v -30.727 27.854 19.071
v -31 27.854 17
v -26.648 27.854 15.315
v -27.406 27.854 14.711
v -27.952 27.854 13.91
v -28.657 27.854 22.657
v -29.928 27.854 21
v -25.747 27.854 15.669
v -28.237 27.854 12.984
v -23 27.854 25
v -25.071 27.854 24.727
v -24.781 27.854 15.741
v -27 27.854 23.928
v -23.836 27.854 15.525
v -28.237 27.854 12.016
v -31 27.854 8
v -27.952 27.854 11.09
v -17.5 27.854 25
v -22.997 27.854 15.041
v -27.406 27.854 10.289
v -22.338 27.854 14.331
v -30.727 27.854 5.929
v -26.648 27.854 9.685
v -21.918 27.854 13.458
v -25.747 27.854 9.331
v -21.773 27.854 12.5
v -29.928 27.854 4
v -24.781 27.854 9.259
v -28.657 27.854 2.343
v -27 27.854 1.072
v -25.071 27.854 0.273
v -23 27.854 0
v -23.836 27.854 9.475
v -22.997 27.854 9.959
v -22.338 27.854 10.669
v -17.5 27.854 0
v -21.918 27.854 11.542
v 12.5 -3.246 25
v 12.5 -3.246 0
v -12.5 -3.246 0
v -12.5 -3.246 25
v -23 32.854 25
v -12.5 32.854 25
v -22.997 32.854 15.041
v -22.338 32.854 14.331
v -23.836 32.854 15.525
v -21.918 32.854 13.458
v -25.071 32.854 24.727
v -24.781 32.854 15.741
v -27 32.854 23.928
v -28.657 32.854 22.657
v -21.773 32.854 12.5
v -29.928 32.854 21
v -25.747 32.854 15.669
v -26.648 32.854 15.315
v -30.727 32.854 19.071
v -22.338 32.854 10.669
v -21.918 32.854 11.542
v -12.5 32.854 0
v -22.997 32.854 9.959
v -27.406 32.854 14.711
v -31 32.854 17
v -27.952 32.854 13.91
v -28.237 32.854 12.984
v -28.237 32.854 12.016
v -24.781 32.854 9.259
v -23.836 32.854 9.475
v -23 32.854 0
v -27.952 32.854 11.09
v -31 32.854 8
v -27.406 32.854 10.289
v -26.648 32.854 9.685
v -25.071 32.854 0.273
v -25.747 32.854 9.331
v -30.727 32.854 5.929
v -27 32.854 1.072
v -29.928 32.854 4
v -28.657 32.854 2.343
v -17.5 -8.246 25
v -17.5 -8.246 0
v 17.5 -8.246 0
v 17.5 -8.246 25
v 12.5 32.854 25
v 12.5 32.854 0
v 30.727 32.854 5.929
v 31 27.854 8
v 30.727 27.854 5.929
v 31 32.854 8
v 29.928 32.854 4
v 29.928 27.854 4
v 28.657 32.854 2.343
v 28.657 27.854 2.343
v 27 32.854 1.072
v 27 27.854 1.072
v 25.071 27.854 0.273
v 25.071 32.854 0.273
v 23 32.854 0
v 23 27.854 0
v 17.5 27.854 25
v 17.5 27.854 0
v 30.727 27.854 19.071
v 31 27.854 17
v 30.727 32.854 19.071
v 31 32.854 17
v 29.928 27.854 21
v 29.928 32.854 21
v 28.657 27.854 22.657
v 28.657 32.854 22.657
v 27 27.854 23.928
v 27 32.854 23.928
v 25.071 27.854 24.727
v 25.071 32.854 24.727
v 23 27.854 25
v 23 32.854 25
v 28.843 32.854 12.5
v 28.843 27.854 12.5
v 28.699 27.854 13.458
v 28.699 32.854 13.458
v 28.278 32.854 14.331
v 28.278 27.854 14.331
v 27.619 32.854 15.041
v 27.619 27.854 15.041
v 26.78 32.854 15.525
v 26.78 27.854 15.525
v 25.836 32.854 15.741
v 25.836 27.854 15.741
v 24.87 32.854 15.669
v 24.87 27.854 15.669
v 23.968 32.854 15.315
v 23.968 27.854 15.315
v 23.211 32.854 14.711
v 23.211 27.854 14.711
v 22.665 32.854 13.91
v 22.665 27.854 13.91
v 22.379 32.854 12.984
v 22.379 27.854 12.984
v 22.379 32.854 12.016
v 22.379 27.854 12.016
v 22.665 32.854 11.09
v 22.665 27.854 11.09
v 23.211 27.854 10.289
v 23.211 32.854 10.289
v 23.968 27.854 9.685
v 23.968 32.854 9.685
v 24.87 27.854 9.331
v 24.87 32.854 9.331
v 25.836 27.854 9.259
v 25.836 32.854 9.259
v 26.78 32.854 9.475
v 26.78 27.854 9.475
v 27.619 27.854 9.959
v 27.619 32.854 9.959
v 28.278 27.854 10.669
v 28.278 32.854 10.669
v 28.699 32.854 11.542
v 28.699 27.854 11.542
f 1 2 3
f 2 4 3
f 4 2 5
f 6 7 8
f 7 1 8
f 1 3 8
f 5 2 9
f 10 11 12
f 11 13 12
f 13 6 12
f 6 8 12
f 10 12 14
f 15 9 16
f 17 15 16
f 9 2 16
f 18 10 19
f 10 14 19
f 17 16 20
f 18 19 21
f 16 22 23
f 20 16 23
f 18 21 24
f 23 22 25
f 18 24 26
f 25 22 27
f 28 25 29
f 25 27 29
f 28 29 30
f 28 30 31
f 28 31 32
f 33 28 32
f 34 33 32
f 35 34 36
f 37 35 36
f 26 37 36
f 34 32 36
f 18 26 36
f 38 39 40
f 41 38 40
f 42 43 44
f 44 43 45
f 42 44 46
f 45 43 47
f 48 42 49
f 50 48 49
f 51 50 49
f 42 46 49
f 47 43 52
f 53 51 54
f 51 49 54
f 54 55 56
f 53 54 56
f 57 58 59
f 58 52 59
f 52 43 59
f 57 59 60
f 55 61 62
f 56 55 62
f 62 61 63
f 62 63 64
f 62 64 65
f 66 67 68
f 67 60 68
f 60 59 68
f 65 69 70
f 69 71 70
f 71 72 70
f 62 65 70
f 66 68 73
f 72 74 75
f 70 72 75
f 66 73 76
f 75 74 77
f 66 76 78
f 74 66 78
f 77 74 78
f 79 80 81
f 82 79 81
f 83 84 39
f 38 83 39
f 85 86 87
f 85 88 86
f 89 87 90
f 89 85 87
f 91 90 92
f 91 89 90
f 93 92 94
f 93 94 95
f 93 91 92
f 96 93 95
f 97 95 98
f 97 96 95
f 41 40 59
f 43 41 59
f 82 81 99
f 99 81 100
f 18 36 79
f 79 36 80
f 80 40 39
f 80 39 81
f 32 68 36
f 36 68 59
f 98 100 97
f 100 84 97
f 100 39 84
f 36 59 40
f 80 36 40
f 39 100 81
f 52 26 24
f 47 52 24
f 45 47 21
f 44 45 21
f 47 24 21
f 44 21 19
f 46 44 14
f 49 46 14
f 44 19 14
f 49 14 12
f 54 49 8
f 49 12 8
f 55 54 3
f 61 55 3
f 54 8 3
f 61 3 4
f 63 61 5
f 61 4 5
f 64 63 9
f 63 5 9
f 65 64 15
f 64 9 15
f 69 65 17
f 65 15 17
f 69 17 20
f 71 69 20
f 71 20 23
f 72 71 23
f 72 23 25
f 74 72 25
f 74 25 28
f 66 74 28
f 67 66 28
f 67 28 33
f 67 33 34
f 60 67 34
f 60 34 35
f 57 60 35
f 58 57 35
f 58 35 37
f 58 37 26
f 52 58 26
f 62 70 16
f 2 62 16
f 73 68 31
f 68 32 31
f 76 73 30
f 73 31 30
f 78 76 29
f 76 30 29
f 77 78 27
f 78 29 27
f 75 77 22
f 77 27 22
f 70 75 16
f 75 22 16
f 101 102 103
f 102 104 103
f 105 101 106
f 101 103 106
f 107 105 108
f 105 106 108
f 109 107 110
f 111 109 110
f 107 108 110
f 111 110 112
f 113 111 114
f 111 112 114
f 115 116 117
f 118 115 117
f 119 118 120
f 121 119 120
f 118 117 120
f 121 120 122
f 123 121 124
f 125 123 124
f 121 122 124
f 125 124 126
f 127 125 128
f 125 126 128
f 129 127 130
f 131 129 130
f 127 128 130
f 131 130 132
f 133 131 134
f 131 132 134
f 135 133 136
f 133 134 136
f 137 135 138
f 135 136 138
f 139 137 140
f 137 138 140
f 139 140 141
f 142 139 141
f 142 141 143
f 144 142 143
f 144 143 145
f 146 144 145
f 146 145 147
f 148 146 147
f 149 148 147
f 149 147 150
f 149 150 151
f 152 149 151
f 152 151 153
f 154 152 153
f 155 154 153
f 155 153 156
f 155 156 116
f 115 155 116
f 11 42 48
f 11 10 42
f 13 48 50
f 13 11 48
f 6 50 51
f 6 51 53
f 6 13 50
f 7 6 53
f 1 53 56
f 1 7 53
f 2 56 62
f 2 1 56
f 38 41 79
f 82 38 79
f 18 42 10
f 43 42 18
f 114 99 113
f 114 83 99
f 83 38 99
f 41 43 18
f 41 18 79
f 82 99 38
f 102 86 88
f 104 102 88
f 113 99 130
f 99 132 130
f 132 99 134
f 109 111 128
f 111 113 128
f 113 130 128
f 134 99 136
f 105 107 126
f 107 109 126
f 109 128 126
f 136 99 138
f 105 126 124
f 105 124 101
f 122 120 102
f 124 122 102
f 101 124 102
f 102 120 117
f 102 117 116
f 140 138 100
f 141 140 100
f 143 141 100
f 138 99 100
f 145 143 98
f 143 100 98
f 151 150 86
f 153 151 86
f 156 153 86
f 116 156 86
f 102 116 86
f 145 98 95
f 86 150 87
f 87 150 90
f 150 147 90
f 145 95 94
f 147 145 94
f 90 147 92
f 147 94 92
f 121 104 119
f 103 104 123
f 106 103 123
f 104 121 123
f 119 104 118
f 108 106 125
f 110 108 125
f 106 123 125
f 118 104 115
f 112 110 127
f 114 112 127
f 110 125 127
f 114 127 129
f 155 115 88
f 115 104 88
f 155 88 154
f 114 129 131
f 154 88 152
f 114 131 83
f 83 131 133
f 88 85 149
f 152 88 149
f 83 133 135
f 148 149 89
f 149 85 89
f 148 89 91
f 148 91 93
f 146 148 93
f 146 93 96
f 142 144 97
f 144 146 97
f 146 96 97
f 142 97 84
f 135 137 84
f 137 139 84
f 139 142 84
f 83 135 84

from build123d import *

# Parameters (mm, degrees)
F1_DEPTH = 25
F3_D     = 6.5
F4_D     = 6.5
F5_R     = 8


with BuildPart() as f1:
    # F0 (on Top) → F1 (new body)
    with BuildSketch(Plane.XY):
        Polygon((31, 27.8544), (31, 32.8544), (12.5, 32.8544), (12.5, -3.2456), (0, -3.2456), (-12.5, -3.2456), (-12.5, 32.8544), (-31, 32.8544), (-31, 27.8544), (-17.5, 27.8544), (-17.5, -8.2456), (0, -8.2456), (17.5, -8.2456), (17.5, 27.8544), align=None)
    extrude(amount=F1_DEPTH)

    # F3 (through all)
    with Locations(Plane(origin=(0, 32.8544, 0), x_dir=(-1, 0, 0), z_dir=(0, 1, 0))):
        with Locations((25.023391, 12.5)):
            Hole(F3_D / 2)

    # F4 (through all)
    with Locations(Plane(origin=(0, 32.8544, 0), x_dir=(-1, 0, 0), z_dir=(0, 1, 0))):
        with Locations((-25.593, 12.5)):
            Hole(F4_D / 2)

    # F5
    f5_edges = [f1.edges().sort_by_distance(p)[0] for p in [
        (-31, 30.3544, 25),
        (-31, 30.3544, 0),
        (31, 30.3544, 25),
        (31, 30.3544, 0),
    ]]
    fillet(f5_edges, radius=F5_R)


solid = f1.part
